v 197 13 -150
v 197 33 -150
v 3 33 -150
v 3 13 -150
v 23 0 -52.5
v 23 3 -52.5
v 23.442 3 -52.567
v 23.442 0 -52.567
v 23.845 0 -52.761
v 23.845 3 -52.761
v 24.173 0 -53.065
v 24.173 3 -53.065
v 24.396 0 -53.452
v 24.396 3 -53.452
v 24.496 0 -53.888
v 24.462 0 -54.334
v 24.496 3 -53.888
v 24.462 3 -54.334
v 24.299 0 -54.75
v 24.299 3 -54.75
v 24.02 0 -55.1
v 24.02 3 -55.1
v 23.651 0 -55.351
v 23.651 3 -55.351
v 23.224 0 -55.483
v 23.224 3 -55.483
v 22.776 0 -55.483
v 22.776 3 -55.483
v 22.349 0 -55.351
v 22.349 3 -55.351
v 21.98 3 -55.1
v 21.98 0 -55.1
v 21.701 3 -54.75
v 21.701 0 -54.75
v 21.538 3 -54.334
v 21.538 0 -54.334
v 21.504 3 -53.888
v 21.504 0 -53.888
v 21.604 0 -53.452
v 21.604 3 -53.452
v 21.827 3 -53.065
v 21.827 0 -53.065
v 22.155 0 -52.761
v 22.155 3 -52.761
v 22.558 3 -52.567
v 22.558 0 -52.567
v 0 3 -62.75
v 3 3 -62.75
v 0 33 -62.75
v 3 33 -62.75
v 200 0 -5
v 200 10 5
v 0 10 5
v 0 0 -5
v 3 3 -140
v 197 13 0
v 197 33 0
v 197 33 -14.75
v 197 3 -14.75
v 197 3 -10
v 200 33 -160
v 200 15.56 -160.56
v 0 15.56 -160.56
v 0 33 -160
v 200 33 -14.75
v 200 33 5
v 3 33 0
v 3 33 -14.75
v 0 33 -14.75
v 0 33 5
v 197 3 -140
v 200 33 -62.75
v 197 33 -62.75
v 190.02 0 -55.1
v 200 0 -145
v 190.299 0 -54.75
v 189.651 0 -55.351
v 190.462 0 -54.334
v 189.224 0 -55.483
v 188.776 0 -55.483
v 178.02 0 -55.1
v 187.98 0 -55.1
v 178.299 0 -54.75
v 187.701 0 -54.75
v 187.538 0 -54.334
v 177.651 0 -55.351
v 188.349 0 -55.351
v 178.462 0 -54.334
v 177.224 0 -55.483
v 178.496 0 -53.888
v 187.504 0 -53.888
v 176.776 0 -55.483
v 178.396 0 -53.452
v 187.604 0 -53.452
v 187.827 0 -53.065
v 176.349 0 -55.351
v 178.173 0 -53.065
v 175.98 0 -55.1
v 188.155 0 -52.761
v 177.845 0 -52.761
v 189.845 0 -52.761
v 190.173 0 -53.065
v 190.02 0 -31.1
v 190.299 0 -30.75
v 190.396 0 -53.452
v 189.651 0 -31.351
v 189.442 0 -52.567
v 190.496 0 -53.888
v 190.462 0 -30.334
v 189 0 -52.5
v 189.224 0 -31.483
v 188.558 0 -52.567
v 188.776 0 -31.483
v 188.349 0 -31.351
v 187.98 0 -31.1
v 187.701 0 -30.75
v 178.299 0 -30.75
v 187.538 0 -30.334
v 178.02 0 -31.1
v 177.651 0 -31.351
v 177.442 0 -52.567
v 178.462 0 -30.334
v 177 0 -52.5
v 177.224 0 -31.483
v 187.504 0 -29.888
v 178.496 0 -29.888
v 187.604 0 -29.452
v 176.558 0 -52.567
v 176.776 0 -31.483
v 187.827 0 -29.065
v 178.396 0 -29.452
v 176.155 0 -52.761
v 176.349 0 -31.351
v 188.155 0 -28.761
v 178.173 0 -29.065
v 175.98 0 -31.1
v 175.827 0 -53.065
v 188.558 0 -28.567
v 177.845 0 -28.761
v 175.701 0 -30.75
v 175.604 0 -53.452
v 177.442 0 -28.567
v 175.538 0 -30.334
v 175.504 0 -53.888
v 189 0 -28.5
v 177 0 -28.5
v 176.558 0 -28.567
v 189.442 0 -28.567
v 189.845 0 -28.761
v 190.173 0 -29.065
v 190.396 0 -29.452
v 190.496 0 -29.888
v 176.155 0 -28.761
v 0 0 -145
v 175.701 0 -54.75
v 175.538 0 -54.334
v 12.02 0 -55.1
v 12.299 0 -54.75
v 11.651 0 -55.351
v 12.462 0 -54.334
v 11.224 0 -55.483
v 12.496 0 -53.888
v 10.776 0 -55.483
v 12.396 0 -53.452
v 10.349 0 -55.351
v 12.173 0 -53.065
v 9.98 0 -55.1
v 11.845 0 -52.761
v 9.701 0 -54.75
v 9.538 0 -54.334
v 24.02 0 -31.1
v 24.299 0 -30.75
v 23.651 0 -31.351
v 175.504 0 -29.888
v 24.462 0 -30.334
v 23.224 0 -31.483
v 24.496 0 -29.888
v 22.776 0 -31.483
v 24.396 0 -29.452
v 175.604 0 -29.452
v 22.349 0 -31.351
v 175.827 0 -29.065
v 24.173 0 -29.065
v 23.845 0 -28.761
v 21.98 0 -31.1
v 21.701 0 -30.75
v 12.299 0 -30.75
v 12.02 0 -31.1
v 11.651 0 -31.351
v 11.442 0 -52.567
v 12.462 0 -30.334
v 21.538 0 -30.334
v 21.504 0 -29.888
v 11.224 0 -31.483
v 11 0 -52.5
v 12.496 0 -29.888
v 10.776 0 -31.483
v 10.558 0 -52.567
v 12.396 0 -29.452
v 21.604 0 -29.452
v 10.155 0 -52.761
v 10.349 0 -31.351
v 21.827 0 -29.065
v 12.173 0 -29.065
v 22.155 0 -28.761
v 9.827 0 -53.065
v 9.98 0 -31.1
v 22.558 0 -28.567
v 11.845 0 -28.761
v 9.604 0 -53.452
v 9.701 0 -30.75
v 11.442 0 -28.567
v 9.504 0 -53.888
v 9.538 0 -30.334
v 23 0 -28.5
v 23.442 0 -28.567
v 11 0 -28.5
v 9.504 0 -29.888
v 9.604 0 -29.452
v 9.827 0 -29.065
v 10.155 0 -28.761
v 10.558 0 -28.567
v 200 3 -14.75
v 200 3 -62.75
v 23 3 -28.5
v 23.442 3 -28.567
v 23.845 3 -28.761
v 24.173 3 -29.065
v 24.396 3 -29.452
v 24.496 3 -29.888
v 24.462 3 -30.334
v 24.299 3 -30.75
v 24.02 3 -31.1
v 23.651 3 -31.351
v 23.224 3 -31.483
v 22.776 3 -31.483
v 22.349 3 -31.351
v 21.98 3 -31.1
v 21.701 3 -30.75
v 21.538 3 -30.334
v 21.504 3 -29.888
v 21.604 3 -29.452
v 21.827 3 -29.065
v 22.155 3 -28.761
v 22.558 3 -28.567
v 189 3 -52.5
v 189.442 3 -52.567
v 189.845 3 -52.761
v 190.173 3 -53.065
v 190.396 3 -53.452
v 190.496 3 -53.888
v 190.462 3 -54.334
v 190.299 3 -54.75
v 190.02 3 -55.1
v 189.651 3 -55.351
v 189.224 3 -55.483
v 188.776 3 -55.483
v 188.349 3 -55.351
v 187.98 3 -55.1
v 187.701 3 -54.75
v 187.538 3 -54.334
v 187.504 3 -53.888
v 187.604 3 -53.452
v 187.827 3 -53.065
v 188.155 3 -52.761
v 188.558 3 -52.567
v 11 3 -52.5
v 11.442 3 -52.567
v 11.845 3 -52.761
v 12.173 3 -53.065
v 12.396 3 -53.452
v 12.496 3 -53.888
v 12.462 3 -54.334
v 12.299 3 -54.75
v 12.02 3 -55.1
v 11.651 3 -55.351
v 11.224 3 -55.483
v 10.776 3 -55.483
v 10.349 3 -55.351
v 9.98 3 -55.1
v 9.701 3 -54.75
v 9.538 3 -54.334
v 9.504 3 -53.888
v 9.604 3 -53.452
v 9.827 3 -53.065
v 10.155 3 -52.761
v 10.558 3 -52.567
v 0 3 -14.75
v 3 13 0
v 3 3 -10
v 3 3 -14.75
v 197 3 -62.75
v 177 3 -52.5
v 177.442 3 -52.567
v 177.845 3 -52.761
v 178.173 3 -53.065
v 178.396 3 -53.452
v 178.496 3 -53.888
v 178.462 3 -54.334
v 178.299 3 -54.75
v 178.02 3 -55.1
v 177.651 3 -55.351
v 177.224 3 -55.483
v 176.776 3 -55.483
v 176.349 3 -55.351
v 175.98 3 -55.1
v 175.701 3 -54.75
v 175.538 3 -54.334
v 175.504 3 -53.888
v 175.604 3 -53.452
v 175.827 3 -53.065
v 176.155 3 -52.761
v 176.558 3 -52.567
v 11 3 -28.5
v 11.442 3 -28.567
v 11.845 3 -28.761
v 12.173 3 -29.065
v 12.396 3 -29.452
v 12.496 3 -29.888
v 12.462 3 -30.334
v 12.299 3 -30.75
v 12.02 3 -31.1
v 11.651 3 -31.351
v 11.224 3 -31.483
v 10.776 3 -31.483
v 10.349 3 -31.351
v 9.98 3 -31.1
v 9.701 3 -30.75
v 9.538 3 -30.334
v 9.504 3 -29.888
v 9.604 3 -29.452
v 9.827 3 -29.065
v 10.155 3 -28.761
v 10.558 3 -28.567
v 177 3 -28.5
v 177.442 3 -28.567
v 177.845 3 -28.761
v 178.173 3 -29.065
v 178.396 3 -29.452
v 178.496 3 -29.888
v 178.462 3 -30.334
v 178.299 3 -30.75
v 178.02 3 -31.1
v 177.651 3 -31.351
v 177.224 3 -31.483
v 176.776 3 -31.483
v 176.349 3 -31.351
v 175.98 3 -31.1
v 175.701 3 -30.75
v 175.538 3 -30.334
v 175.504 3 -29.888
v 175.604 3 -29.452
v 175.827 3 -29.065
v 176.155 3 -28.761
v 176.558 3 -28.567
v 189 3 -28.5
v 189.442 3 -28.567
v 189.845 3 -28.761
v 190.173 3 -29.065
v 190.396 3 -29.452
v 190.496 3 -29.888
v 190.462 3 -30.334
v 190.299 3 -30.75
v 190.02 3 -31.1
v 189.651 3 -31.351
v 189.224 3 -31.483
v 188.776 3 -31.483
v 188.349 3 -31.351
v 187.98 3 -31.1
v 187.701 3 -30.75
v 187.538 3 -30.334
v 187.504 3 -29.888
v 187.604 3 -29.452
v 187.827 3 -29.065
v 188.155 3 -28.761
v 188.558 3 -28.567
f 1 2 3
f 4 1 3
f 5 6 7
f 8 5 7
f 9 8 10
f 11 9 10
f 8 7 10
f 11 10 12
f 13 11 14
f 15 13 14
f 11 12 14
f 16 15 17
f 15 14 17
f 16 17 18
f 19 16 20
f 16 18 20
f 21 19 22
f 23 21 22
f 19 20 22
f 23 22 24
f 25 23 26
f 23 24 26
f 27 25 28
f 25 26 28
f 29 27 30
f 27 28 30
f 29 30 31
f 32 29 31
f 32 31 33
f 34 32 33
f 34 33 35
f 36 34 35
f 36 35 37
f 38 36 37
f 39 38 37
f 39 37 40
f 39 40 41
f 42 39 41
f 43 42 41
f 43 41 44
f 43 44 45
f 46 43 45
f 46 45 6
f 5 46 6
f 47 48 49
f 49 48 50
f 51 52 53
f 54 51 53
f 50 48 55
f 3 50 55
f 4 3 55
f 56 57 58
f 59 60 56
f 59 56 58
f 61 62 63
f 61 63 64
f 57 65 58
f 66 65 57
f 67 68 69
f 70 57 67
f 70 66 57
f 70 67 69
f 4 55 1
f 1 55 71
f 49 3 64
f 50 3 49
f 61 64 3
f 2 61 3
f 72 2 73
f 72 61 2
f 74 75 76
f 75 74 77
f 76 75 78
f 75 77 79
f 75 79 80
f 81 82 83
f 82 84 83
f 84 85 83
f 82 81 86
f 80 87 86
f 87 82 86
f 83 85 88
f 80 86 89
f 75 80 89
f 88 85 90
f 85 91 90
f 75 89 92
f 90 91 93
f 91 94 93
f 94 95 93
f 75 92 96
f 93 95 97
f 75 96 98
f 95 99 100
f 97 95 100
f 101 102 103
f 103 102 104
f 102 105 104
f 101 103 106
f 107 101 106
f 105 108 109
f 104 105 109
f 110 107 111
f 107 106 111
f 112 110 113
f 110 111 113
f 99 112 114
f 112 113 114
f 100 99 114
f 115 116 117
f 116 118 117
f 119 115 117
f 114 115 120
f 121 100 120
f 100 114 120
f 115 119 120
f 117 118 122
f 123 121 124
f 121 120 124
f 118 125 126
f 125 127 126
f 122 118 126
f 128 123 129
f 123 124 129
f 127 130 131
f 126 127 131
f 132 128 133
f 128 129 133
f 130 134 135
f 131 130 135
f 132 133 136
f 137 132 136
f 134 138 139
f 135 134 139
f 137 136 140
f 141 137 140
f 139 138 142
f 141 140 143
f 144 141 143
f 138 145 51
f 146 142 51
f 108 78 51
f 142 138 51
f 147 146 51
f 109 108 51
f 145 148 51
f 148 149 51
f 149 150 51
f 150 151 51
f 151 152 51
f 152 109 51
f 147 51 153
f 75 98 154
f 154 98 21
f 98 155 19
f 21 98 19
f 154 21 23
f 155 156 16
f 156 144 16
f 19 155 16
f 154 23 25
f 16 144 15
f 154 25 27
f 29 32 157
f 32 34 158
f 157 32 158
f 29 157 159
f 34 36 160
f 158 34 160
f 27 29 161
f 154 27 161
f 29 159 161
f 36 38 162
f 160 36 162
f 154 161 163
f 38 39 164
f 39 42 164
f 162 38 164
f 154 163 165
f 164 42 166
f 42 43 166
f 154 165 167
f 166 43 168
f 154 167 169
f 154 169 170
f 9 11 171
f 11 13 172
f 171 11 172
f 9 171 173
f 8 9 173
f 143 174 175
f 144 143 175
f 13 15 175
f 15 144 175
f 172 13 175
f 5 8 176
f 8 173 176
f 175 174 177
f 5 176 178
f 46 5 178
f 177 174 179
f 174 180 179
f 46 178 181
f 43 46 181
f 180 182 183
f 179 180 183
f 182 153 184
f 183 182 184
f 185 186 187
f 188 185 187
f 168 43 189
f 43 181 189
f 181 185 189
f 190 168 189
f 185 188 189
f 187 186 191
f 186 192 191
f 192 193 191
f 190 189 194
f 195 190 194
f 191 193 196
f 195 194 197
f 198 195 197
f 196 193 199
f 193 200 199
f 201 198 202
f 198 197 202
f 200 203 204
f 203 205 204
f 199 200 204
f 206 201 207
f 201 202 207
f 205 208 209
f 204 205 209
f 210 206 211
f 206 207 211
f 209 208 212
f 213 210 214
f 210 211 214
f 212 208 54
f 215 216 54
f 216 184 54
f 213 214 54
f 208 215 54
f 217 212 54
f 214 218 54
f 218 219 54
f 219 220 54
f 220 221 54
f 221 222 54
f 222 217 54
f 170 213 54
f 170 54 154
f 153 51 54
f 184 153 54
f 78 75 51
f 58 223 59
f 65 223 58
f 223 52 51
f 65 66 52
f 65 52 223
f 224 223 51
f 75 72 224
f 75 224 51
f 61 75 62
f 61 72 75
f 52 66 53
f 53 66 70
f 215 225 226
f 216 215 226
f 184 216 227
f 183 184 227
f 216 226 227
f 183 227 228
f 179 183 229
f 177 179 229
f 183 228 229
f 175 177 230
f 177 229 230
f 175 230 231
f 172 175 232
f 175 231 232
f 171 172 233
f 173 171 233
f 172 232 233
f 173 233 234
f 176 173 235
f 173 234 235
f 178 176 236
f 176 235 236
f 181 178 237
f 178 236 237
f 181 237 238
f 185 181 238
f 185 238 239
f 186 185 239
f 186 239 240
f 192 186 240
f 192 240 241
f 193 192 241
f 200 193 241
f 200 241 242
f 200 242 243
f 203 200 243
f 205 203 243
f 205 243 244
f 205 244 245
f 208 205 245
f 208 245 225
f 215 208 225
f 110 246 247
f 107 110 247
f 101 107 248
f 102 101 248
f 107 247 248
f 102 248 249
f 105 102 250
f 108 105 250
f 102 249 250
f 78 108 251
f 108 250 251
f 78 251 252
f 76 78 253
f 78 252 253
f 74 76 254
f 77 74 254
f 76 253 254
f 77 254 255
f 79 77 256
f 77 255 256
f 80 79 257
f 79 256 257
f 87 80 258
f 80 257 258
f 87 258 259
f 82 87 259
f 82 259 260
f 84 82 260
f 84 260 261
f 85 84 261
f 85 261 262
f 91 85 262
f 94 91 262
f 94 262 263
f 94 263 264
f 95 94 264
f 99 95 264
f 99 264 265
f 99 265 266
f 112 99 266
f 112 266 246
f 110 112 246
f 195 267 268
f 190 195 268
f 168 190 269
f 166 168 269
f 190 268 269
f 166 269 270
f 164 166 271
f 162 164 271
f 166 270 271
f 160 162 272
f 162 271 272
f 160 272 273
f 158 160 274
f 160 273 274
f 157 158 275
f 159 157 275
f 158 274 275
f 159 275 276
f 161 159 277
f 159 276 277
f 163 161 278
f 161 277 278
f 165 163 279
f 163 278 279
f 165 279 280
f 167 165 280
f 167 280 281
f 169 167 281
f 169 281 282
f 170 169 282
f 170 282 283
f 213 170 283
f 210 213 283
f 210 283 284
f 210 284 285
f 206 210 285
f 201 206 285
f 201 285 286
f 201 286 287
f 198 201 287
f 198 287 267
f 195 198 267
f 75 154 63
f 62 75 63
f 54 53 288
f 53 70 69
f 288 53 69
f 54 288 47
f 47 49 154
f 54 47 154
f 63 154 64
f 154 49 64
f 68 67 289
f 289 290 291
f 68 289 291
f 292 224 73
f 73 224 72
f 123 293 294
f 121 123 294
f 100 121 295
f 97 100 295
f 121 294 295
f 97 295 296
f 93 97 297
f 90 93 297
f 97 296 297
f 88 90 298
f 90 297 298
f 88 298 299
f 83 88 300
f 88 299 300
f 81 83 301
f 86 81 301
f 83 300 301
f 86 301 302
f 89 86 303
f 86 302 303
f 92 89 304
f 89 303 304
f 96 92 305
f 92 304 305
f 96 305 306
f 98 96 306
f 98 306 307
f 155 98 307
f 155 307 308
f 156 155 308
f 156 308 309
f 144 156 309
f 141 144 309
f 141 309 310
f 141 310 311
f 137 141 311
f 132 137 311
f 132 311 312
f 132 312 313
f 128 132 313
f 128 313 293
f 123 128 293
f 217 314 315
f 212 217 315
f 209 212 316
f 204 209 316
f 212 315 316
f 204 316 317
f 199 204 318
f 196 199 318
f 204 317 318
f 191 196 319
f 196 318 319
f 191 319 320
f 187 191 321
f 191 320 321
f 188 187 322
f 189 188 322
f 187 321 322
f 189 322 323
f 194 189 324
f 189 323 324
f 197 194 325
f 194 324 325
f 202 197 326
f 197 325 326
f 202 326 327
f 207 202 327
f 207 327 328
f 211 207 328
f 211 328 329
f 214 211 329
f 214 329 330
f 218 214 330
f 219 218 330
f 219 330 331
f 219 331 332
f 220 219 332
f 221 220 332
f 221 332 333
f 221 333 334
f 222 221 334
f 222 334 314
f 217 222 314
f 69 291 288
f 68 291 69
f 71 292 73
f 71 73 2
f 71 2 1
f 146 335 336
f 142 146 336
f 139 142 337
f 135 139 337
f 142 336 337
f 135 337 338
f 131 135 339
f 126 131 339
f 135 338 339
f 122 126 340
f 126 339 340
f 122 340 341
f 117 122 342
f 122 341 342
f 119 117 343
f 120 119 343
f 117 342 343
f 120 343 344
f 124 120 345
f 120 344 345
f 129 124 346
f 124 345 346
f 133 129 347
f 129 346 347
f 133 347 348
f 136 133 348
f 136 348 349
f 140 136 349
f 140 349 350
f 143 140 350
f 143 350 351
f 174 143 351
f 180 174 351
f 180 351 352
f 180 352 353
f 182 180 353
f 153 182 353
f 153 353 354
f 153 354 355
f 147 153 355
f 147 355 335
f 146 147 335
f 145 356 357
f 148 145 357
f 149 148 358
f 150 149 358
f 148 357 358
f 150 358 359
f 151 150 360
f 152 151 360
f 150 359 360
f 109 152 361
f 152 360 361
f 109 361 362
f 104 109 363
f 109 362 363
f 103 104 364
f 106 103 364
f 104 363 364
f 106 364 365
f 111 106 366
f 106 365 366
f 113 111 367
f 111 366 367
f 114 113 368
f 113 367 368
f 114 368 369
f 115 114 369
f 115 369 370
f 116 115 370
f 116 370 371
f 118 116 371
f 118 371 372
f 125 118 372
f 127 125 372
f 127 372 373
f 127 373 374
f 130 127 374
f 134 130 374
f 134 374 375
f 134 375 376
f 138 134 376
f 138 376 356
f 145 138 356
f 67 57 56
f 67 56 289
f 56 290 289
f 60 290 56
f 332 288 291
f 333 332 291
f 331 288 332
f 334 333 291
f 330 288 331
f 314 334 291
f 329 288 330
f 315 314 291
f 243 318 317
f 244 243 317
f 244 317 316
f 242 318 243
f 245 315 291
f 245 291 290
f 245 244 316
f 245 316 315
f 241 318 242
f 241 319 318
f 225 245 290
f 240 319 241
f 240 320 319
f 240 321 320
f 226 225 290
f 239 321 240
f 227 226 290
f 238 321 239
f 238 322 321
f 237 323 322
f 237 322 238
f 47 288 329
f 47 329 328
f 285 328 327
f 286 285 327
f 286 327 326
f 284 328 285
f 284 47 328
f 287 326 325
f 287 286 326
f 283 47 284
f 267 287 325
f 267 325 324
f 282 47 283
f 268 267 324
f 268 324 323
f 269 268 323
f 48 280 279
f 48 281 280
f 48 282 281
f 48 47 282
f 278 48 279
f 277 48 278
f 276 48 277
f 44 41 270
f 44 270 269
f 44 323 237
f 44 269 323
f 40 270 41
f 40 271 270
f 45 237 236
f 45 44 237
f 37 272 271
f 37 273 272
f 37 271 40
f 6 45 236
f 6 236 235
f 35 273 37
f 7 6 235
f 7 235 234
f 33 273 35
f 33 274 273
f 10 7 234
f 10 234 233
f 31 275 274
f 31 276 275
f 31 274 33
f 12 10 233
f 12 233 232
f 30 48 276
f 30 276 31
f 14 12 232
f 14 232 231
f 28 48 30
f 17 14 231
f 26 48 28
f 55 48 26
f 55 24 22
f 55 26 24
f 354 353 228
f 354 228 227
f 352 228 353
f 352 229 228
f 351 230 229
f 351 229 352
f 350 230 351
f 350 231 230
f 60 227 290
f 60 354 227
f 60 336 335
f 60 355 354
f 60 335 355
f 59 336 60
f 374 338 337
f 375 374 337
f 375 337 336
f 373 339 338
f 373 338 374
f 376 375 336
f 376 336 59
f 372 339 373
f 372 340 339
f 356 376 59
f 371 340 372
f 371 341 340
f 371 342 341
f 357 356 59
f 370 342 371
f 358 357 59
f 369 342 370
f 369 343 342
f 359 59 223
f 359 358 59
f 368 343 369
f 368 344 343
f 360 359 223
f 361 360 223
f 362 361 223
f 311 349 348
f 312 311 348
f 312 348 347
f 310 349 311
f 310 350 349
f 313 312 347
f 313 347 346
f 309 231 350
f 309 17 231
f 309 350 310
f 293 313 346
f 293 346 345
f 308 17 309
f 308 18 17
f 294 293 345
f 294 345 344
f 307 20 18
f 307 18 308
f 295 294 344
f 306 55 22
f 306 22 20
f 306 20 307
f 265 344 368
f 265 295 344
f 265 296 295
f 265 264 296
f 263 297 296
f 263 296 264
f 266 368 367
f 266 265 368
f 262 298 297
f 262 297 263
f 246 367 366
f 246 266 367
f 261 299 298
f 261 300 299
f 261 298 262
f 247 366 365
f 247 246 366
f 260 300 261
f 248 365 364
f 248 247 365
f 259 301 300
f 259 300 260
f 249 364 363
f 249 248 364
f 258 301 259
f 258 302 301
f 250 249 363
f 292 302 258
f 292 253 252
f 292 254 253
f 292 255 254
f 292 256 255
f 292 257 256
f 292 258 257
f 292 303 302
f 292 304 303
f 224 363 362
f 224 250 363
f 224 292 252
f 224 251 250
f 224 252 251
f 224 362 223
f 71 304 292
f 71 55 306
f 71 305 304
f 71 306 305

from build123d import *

# Parameters (mm, degrees)
CROQUIS1_W              = 200
CROQUIS1_H              = 150
SALIENTE_EXTRUIR1_DEPTH = 3
CROQUIS2_W              = 3
CROQUIS2_H              = 150
SALIENTE_EXTRUIR2_DEPTH = 30
SALIENTE_EXTRUIR4_DEPTH = 5
CROQUIS6_W              = 200
CROQUIS6_H              = 33
SALIENTE_EXTRUIR5_DEPTH = 5
CHAFL_N1_SIZE           = 10
CHAFL_N2_SIZE           = 10
CROQUIS7_R              = 1.5
CORTAR_EXTRUIR2_DEPTH   = 10
CROQUIS8_W              = 48
CROQUIS8_H              = 30
CORTAR_EXTRUIR3_DEPTH   = 200
SALIENTE_EXTRUIR6_DEPTH = 200


with BuildPart() as part:
    # Croquis1 → Saliente-Extruir1 (new body)
    with BuildSketch(Plane(origin=(0, 0, 0), x_dir=(1, 0, 0), z_dir=(0, 1, 0))):
        with Locations((100, 75)):
            Rectangle(CROQUIS1_W, CROQUIS1_H)
    extrude(amount=SALIENTE_EXTRUIR1_DEPTH)

    # Croquis2 → Saliente-Extruir2 (add)
    with BuildSketch(Plane(origin=(0, 3, 0), x_dir=(1, 0, 0), z_dir=(0, 1, 0))):
        with Locations((1.5, 75)):
            Rectangle(CROQUIS2_W, CROQUIS2_H)
        with Locations((198.5, 75)):
            Rectangle(CROQUIS2_W, CROQUIS2_H)
    extrude(amount=SALIENTE_EXTRUIR2_DEPTH)

    # Croquis5 → Saliente-Extruir4 (add)
    with BuildSketch(Plane.XY):
        Polygon((0, 33), (3, 33), (200, 33), (200, 0), (0, 0), align=None)
    extrude(amount=SALIENTE_EXTRUIR4_DEPTH)

    # Croquis6 → Saliente-Extruir5 (add)
    with BuildSketch(Plane(origin=(0, 0, -150), x_dir=(-1, 0, 0), z_dir=(0, 0, -1))):
        with Locations((-100, 16.5)):
            Rectangle(CROQUIS6_W, CROQUIS6_H)
    extrude(amount=SALIENTE_EXTRUIR5_DEPTH)

    # Chaflán1
    chafl_n1_edges = [part.edges().sort_by_distance(p)[0] for p in [
        (100, 0, 5),
        (100, 0, -155),
    ]]
    chamfer(chafl_n1_edges, length=CHAFL_N1_SIZE)

    # Chaflán2
    chafl_n2_edges = [part.edges().sort_by_distance(p)[0] for p in [
        (100, 3, 0),
        (100, 3, -150),
    ]]
    chamfer(chafl_n2_edges, length=CHAFL_N2_SIZE)

    # Croquis7 → Cortar-Extruir2 (cut)
    with BuildSketch(Plane(origin=(0, 3, 0), x_dir=(1, 0, 0), z_dir=(0, 1, 0))):
        with Locations(Location((189, 30, 0), (0, 0, 270))):
            Circle(CROQUIS7_R)
        with Locations(Location((177, 30, 0), (0, 0, 270))):
            Circle(CROQUIS7_R)
        with Locations(Location((189, 54, 0), (0, 0, 270))):
            Circle(CROQUIS7_R)
        with Locations(Location((177, 54, 0), (0, 0, 270))):
            Circle(CROQUIS7_R)
        with Locations(Location((23, 30, 0), (0, 0, 270))):
            Circle(CROQUIS7_R)
        with Locations(Location((11, 30, 0), (0, 0, 270))):
            Circle(CROQUIS7_R)
        with Locations(Location((23, 54, 0), (0, 0, 270))):
            Circle(CROQUIS7_R)
        with Locations(Location((11, 54, 0), (0, 0, 270))):
            Circle(CROQUIS7_R)
    extrude(amount=-CORTAR_EXTRUIR2_DEPTH, mode=Mode.SUBTRACT)

    # Croquis8 → Cortar-Extruir3 (cut)
    with BuildSketch(Plane(origin=(200, 0, 0), x_dir=(0, 0, -1), z_dir=(1, 0, 0))):
        with Locations((38.75, 18)):
            Rectangle(CROQUIS8_W, CROQUIS8_H)
    extrude(amount=-CORTAR_EXTRUIR3_DEPTH, mode=Mode.SUBTRACT)

    # Croquis9 → Saliente-Extruir6 (add)
    with BuildSketch(Plane(origin=(200, 0, 0), x_dir=(0, 0, -1), z_dir=(1, 0, 0))):
        Polygon((155, 10), (160.560253642, 15.560253642), (160, 33), (155, 33), align=None)
    extrude(amount=-SALIENTE_EXTRUIR6_DEPTH)


solid = part.part
